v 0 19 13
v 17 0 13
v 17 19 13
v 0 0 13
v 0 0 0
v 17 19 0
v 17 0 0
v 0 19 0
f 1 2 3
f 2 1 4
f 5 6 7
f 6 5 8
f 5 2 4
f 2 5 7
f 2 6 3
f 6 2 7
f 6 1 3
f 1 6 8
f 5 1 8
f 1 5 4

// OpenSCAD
// Generated by SolidPython 1.0.1 on 2020-07-29 00:46:56


cube(size = [17, 19, 13]);
/***********************************************
*********      SolidPython code:      **********
************************************************
 
# import packages: SolidPython
from solid import *
from solid.utils import *
from itertools import chain, combinations, permutations


class Resize:

    def __init__(self, scad_file):
        self.scad_file = scad_file
        #self.scad_file = import_scad(scad_file)
        # cone/cylinder param:
        self.r1 = 0
        self.r2 = 0
        self.h = 0
        # rectangular prism param:
        self.w = 0
        self.l = 0
        # ellipse param:
        self.r = 0

    # import OpenScad code (file name corresponds to shape)


    # classify shape + parameters
    def assign(self, param1, param2, param3):
        if self.scad_file == 'cone.scad':
            self.r1 = param1
            self.r2 = param2
            self.h = param3
        elif self.scad_file == 'cylinder.scad':
            self.r1 = param1
            self.r2 = param2
            self.h = param3
        elif self.scad_file == 'rectangularPrism.scad':
            self.h = param1
            self.l = param2
            self.w = param3
        else:
            self.r = param1
            self.h = param2

    # resize parameters
    def iterate(self):
        x = range(3, 20, 2)
        i = 1
        if self.scad_file == 'cone.scad':
            tempList = list(permutations(x, 2))
            for temp in tempList:
                param1 = temp[0]
                param2 = temp[1]
                filepath = 'produced_scad_files/' + 'cone' + str(param1) + '_' + str(param2) + '_' + '.scad'
                scad_render_to_file(cylinder(h=param1, r1=param2, r2=0), filepath)

        elif self.scad_file == 'cylinder.scad':
            tempList = list(permutations(x, 3))
            for temp in tempList:
                param1 = temp[0]
                param2 = temp[1]
                filepath = 'produced_scad_files/' + 'cylinder' + str(param1) + '_' + str(param2) + '_' + '.scad'
                scad_render_to_file(cylinder(h=param1, r1=param2, r2=param2), filepath)

        elif self.scad_file == 'rectangularPrism.scad':
            tempList = list(permutations(x, 3))
            for temp in tempList:
                param1 = temp[0]
                param2 = temp[1]
                param3 = temp[2]
                filepath = 'produced_scad_files/' + 'rectangularPrism' + str(param1) + '_' + str(param2) + '_' + str(
                    param3) + '.scad'
                scad_render_to_file(cube(size=(param1, param2, param3)), filepath)

        elif self.scad_file == 'ellipse.scad':
            tempList = list(permutations(x, 4))
            for temp in tempList:
                param1 = temp[0]
                param2 = temp[1]
                param3 = temp[2]
                param4 = temp[3]
                filepath = 'produced_scad_files/' + 'ellipse' + str(param1) + '_' + str(param2) + '_' + str(param3) + '_' + str(param4) + '.scad'
                scad_render_to_file(scale([param1, param2, param3])(sphere(r=param4)), filepath)

    def render_to_scadfile(self):
        scad_render_to_file(scad, 'example.scad') 
 
************************************************/
